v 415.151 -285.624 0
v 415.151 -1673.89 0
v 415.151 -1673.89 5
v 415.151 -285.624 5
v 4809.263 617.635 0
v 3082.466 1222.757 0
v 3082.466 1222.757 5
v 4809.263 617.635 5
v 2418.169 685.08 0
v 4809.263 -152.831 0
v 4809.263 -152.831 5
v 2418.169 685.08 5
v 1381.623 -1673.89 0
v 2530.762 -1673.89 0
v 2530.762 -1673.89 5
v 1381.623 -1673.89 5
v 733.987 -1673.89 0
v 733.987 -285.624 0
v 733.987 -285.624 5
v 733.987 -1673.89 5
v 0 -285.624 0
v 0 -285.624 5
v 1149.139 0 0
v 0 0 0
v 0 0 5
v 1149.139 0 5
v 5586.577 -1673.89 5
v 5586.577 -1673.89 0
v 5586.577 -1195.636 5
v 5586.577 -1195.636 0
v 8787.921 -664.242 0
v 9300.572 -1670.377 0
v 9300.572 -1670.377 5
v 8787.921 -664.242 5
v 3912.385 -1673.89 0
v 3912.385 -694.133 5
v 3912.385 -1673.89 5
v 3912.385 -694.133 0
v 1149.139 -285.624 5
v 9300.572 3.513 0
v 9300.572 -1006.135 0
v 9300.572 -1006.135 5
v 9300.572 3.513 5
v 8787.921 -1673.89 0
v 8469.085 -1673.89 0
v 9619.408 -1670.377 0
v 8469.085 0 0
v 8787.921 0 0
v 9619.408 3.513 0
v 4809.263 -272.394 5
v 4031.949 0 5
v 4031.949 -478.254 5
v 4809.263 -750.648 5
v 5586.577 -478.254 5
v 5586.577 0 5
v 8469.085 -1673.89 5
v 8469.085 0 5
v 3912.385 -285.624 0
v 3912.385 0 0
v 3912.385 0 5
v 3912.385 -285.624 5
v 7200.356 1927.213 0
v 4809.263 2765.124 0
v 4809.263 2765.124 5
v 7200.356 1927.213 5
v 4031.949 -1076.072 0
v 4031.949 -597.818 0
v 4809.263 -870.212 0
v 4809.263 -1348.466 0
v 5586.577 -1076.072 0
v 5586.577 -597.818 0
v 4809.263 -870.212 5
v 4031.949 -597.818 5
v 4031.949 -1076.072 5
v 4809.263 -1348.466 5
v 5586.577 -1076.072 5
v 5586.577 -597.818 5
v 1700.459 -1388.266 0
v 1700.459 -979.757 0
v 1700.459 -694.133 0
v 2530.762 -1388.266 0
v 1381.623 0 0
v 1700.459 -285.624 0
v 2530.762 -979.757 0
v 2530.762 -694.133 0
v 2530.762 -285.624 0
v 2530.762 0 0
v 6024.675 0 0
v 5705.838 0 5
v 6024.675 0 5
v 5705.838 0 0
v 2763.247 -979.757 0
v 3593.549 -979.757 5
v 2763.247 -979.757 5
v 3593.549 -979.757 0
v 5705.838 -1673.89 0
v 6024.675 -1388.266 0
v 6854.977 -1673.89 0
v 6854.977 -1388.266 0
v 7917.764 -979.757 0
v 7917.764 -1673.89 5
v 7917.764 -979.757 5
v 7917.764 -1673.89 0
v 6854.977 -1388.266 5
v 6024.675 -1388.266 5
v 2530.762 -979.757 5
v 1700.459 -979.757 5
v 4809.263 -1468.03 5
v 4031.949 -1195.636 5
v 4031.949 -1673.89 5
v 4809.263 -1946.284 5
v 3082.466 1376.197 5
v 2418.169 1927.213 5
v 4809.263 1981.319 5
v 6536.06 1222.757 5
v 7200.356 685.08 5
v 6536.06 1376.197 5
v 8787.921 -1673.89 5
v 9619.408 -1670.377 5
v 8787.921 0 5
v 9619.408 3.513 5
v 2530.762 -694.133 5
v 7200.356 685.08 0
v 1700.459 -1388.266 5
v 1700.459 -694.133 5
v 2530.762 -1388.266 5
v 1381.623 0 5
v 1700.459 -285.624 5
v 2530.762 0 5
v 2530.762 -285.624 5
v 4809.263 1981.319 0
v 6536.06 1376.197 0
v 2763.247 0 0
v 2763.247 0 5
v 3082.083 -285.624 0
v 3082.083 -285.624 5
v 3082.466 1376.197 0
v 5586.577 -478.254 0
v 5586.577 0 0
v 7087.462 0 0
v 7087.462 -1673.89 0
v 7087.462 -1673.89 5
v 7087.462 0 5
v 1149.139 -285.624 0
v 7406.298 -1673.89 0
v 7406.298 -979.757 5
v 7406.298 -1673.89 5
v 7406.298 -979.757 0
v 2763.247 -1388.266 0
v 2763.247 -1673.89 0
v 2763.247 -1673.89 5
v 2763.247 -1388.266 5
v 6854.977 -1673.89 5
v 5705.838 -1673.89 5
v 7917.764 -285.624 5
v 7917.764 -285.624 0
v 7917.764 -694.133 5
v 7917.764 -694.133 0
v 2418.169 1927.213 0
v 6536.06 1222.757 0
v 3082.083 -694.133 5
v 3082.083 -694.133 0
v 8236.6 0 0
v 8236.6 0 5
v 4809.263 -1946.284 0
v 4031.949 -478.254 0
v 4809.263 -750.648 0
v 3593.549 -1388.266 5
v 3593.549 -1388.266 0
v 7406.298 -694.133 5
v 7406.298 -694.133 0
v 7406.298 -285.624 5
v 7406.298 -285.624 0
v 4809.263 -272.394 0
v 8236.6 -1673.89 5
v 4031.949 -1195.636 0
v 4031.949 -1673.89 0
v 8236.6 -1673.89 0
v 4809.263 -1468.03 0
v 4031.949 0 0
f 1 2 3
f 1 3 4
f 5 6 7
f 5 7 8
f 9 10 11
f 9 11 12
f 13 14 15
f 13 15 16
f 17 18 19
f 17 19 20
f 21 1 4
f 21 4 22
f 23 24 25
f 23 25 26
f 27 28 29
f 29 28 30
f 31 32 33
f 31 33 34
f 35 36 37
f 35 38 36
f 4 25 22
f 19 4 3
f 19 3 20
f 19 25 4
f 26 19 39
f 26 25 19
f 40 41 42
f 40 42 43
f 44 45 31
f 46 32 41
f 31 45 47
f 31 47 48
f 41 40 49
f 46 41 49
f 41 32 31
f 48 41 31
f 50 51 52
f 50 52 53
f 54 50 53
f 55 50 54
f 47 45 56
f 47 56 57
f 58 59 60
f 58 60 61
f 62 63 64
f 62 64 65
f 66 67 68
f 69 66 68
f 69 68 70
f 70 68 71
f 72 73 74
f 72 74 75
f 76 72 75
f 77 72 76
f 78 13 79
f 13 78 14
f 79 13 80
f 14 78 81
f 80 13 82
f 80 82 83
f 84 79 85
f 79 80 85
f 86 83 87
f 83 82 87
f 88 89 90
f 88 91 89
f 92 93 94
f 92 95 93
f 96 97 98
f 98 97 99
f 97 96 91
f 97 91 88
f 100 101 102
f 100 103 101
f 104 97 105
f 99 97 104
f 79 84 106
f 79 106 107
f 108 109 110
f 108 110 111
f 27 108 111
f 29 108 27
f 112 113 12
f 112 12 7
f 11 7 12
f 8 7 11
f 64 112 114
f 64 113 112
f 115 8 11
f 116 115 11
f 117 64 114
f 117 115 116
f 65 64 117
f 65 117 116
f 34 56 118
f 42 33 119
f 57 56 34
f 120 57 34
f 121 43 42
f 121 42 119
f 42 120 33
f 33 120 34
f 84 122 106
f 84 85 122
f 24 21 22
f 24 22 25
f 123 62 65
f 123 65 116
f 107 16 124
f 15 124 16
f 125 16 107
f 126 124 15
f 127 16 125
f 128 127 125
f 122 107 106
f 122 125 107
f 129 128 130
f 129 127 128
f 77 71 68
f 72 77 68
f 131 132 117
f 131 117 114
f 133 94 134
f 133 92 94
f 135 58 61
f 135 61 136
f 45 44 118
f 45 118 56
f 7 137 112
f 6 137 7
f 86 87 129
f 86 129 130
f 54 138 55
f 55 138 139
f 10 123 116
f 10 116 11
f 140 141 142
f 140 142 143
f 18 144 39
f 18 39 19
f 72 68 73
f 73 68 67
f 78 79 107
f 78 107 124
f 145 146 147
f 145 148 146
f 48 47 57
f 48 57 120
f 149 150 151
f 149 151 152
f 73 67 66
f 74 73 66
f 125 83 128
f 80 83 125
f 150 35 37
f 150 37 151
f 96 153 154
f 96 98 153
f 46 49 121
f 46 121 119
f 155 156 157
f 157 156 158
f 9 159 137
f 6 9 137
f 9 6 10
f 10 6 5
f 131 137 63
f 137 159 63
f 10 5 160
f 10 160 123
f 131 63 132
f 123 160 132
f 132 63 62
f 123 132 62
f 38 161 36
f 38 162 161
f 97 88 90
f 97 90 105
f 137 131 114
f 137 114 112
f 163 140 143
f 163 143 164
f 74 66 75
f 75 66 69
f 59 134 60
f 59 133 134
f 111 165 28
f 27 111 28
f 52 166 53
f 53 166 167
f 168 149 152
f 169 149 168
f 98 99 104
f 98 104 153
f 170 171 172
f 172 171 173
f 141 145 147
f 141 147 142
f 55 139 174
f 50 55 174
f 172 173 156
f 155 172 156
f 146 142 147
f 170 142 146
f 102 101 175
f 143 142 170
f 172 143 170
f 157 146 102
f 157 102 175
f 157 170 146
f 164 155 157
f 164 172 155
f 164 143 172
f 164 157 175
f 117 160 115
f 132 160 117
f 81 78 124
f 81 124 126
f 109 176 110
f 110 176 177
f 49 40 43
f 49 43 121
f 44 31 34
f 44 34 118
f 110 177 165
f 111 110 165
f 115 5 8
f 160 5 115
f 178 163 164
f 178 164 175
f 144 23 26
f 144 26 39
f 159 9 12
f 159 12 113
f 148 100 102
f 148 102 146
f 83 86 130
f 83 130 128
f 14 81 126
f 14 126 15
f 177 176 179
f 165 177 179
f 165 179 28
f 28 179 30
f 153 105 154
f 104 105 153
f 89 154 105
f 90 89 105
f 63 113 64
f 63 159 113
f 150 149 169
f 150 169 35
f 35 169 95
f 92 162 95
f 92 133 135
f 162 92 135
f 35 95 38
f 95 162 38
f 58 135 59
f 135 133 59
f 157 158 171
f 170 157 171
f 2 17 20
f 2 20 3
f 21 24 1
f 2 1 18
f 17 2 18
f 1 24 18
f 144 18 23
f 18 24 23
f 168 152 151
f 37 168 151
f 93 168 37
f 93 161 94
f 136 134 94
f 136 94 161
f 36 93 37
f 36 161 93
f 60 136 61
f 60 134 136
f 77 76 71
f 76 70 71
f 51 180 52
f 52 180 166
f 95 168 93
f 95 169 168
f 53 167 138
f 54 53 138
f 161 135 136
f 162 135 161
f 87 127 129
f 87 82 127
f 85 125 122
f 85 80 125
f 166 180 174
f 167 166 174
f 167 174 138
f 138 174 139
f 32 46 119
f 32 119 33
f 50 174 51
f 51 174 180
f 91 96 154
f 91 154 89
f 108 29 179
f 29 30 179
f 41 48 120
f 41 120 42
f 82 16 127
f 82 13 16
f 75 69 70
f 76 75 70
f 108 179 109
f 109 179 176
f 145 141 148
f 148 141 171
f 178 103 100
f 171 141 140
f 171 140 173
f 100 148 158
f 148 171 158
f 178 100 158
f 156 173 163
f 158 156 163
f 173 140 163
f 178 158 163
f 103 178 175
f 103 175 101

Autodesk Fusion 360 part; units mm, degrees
sketch "Sketch1" plane through (0, 0, 0) normal (0, 0, 1) x (1, 0, 0)
  line L0 (0, 0) -> (1149.1386, 0)
  line L1 (1149.1386, 0) -> (1149.1386, -285.624)
  line L2 (1149.1386, -285.624) -> (733.9874, -285.624)
  line L3 (733.9874, -285.624) -> (733.9874, -1673.8897)
  line L4 (733.9874, -1673.8897) -> (415.1512, -1673.8897)
  line L5 (415.1512, -1673.8897) -> (415.1512, -285.624)
  line L6 (415.1512, -285.624) -> (0, -285.624)
  line L7 (0, -285.624) -> (0, 0)
  line L8 (1149.1386, 0) -> (1381.6233, 0) construction
  line L9 (1381.6233, 0) -> (2530.7619, 0)
  line L10 (2530.7619, 0) -> (2530.7619, -285.624)
  line L11 (2530.7619, -285.624) -> (1700.4594, -285.624)
  line L12 (1700.4594, -285.624) -> (1700.4594, -694.1329)
  line L13 (1700.4594, -694.1329) -> (2530.7619, -694.1329)
  line L14 (2530.7619, -694.1329) -> (2530.7619, -979.7569)
  line L15 (2530.7619, -979.7569) -> (1700.4594, -979.7569)
  line L16 (1700.4594, -979.7569) -> (1700.4594, -1388.2657)
  line L17 (1700.4594, -1388.2657) -> (2530.7619, -1388.2657)
  line L18 (2530.7619, -1388.2657) -> (2530.7619, -1673.8897)
  line L19 (2530.7619, -1673.8897) -> (1381.6233, -1673.8897)
  line L20 (1381.6233, -1673.8897) -> (1381.6233, 0)
  line L21 (2530.7619, 0) -> (2763.2466, 0) construction
  line L22 (2763.2466, 0) -> (3912.3852, 0)
  line L23 (3912.3852, 0) -> (3912.3852, -285.624)
  line L24 (3912.3852, -285.624) -> (3082.0827, -285.624)
  line L25 (3082.0827, -285.624) -> (3082.0827, -694.1329)
  line L26 (3082.0827, -694.1329) -> (3912.3852, -694.1329)
  line L27 (3912.3852, -694.1329) -> (3912.3852, -1673.8897)
  line L28 (3912.3852, -1673.8897) -> (2763.2466, -1673.8897)
  line L29 (2763.2466, -1673.8897) -> (2763.2466, -1388.2657)
  line L30 (2763.2466, -1388.2657) -> (3593.549, -1388.2657)
  line L31 (3593.549, -1388.2657) -> (3593.549, -979.7569)
  line L32 (3593.549, -979.7569) -> (2763.2466, -979.7569)
  line L33 (2763.2466, -979.7569) -> (2763.2466, 0)
  line L34 (3912.3852, 0) -> (4031.9487, 0) construction
  line L35 (4031.9487, 0) -> (5586.2749, 0) construction
  line L36 (5586.2749, 0) -> (5705.8385, 0) construction
  line L37 (5705.8385, 0) -> (6024.6746, 0)
  line L38 (6024.6746, 0) -> (6024.6746, -1388.2657)
  line L39 (6024.6746, -1388.2657) -> (6854.977, -1388.2657)
  line L40 (6854.977, -1388.2657) -> (6854.977, -1673.8897)
  line L41 (6854.977, -1673.8897) -> (5705.8385, -1673.8897)
  line L42 (5705.8385, -1673.8897) -> (5705.8385, 0)
  line L43 (6854.977, -1388.2657) -> (7087.4617, -1388.2657) construction
  line L44 (7087.4617, -1388.2657) -> (7087.4617, 0)
  line L45 (7087.4617, 0) -> (8236.6003, 0)
  line L46 (8236.6003, 0) -> (8236.6003, -1673.8897)
  line L47 (8236.6003, -1673.8897) -> (7917.7642, -1673.8897)
  line L48 (7917.7642, -1673.8897) -> (7917.7642, -979.7569)
  line L49 (7917.7642, -979.7569) -> (7406.2979, -979.7569)
  line L50 (7406.2979, -979.7569) -> (7406.2979, -1673.8897)
  line L51 (7406.2979, -1673.8897) -> (7087.4617, -1673.8897)
  line L52 (7087.4617, -1673.8897) -> (7087.4617, -1388.2657)
  line L53 (7087.4617, 0) -> (7406.2979, 0) construction
  line L54 (7406.2979, 0) -> (7406.2979, -285.624) construction
  line L55 (7406.2979, -285.624) -> (7087.4617, -285.624) construction
  line L56 (7087.4617, -285.624) -> (7087.4617, 0) construction
  line L57 (7406.2979, -285.624) -> (7917.7642, -285.624)
  line L58 (7917.7642, -285.624) -> (7917.7642, -694.1329)
  line L59 (7917.7642, -694.1329) -> (7406.2979, -694.1329)
  line L60 (7406.2979, -694.1329) -> (7406.2979, -285.624)
  line L61 (8236.6003, 0) -> (8469.085, 0) construction
  line L62 (8469.085, 0) -> (8787.9212, 0)
  line L63 (8787.9212, 0) -> (9300.5724, -1006.1347)
  line L64 (9300.5724, -1006.1347) -> (9300.5724, 3.5131)
  line L65 (9300.5724, 3.5131) -> (9619.4085, 3.5131)
  line L66 (9619.4085, 3.5131) -> (9619.4085, -1670.3766)
  line L67 (9619.4085, -1670.3766) -> (9300.5724, -1670.3766)
  line L68 (9300.5724, -1670.3766) -> (8787.9212, -664.242)
  line L69 (8787.9212, -664.242) -> (8787.9212, -1673.8897)
  line L70 (8787.9212, -1673.8897) -> (8469.085, -1673.8897)
  line L71 (8469.085, -1673.8897) -> (8469.085, 0)
  line L72 (4031.9487, 0) -> (4031.9487, -478.2542)
  line L73 (4031.9487, -478.2542) -> (4809.2628, -750.6485)
  line L74 (4809.2628, -750.6485) -> (5586.5769, -478.2542)
  line L75 (5586.5769, -478.2542) -> (5586.5769, 0)
  line L76 (5586.5769, 0) -> (4809.2628, -272.3943)
  line L77 (4809.2628, -272.3943) -> (4031.9487, 0)
  line L78 (4031.9487, -478.2542) -> (4031.9487, -597.8178) construction
  line L79 (4031.9487, -597.8178) -> (4031.9487, -1076.072)
  line L80 (4031.9487, -1076.072) -> (4809.2628, -1348.4663)
  line L81 (4809.2628, -1348.4663) -> (5586.5769, -1076.072)
  line L82 (5586.5769, -1076.072) -> (5586.5769, -597.8178)
  line L83 (5586.5769, -597.8178) -> (4809.2628, -870.2121)
  line L84 (4809.2628, -870.2121) -> (4031.9487, -597.8178)
  line L85 (4031.9487, -1076.072) -> (4031.9487, -1195.6355) construction
  line L86 (4031.9487, -1195.6355) -> (4031.9487, -1673.8897)
  line L87 (4031.9487, -1673.8897) -> (4809.2628, -1946.284)
  line L88 (4809.2628, -1946.284) -> (5586.5769, -1673.8897)
  line L89 (5586.5769, -1673.8897) -> (5586.5769, -1195.6355)
  line L90 (5586.5769, -1195.6355) -> (4809.2628, -1468.0298)
  line L91 (4809.2628, -1468.0298) -> (4031.9487, -1195.6355)
  line L92 (4809.2628, -272.3943) -> (4809.2628, -152.8307) construction
  line L93 (4809.2628, -152.8307) -> (2418.1694, 685.0805)
  line L94 (2418.1694, 685.0805) -> (2418.1694, 1927.213)
  line L95 (2418.1694, 1927.213) -> (4809.2628, 2765.1242)
  line L96 (4809.2628, 2765.1242) -> (7200.3562, 1927.213)
  line L97 (7200.3562, 1927.213) -> (7200.3562, 685.0805)
  line L98 (7200.3562, 685.0805) -> (4809.2628, -152.8307)
  line L99 (4809.2628, 2765.1242) -> (4809.2628, 1981.3187) construction
  line L100 (4809.2628, 1981.3187) -> (3082.4658, 1376.1969)
  line L101 (3082.4658, 1376.1969) -> (3082.4658, 1222.757)
  line L102 (3082.4658, 1222.757) -> (4809.2628, 617.6353)
  line L103 (4809.2628, 617.6353) -> (6536.0598, 1222.757)
  line L104 (6536.0598, 1222.757) -> (6536.0598, 1376.1969)
  line L105 (6536.0598, 1376.1969) -> (4809.2628, 1981.3187)
  dimension "d38" = 1149.1386
  dimension "d39" = 90
  dimension "d40" = 285.624
  dimension "d41" = 90
  dimension "d42" = 415.1512
  dimension "d43" = 90
  dimension "d44" = 1388.2657
  dimension "d45" = 90
  dimension "d46" = 318.8361
  dimension "d47" = 90
  dimension "d48" = 1388.2657
  dimension "d49" = 90
  dimension "d50" = 415.1512
  dimension "d51" = 285.624
  dimension "d52" = 90
  dimension "d53" = 232.4847
  dimension "d54" = 1149.1386
  dimension "d55" = 285.624
  dimension "d56" = 90
  dimension "d57" = 830.3025
  dimension "d58" = 90
  dimension "d59" = 408.5088
  dimension "d60" = 90
  dimension "d61" = 830.3025
  dimension "d62" = 285.624
  dimension "d63" = 90
  dimension "d64" = 830.3025
  dimension "d65" = 408.5088
  dimension "d66" = 830.3025
  dimension "d67" = 285.624
  dimension "d68" = 1149.1386
  dimension "d69" = 232.4847
  dimension "d70" = 1149.1386
  dimension "d71" = 90
  dimension "d72" = 285.624
  dimension "d73" = 90
  dimension "d74" = 830.3025
  dimension "d75" = 408.5088
  dimension "d76" = 830.3025
  dimension "d77" = 979.7569
  dimension "d78" = 1149.1386
  dimension "d79" = 285.624
  dimension "d80" = 830.3025
  dimension "d81" = 408.5088
  dimension "d82" = 830.3025
  dimension "d83" = 119.5636
  dimension "d84" = 1554.3262
  dimension "d85" = 119.5636
  dimension "d86" = 318.8361
  dimension "d87" = 1388.2657
  dimension "d88" = 830.3025
  dimension "d89" = 285.624
  dimension "d90" = 1149.1386
  dimension "d91" = 1673.8897
  dimension "d92" = 232.4847
  dimension "d93" = 1388.2657
  dimension "d94" = 1149.1386
  dimension "d95" = 1673.8897
  dimension "d96" = 318.8361
  dimension "d97" = 694.1329
  dimension "d98" = 511.4663
  dimension "d99" = 694.1329
  dimension "d100" = 318.8361
  dimension "d101" = 318.8361
  dimension "d102" = 285.624
  dimension "d103" = 511.4663
  dimension "d104" = 408.5088
  dimension "d105" = 232.4847
  dimension "d106" = 318.8361
  dimension "d107" = 117
  dimension "d108" = 1129.2113
  dimension "d109" = 1009.6478
  dimension "d110" = 318.8361
  dimension "d111" = 1673.8897
  dimension "d112" = 318.8361
  dimension "d113" = 117
  dimension "d114" = 1129.2113
  dimension "d115" = 1009.6478
  dimension "d116" = 318.8361
  dimension "d117" = 478.2542
  dimension "d118" = 109.312
  dimension "d119" = 823.66
  dimension "d120" = 141.376
  dimension "d121" = 823.66
  dimension "d122" = 109.312
  dimension "d123" = 478.2542
  dimension "d124" = 70.688
  dimension "d125" = 823.66
  dimension "d126" = 119.5636
  dimension "d127" = 478.2542
  dimension "d128" = 823.66
  dimension "d129" = 109.312
  dimension "d130" = 141.376
  dimension "d131" = 823.66
  dimension "d132" = 109.312
  dimension "d133" = 478.2542
  dimension "d134" = 70.688
  dimension "d135" = 823.66
  dimension "d136" = 119.5636
  dimension "d137" = 478.2542
  dimension "d138" = 109.312
  dimension "d139" = 823.66
  dimension "d140" = 141.376
  dimension "d141" = 823.66
  dimension "d142" = 109.312
  dimension "d143" = 478.2542
  dimension "d144" = 70.688
  dimension "d145" = 823.66
  dimension "d146" = 119.5636
  dimension "d147" = 109.312
  dimension "d148" = 2533.658
  dimension "d149" = 109.312
  dimension "d150" = 1242.1325
  dimension "d151" = 109.312
  dimension "d152" = 2533.658
  dimension "d153" = 141.376
  dimension "d154" = 2533.658
  dimension "d155" = 109.312
  dimension "d156" = 1242.1325
  dimension "d157" = 783.8055
  dimension "d158" = 1829.7541
  dimension "d159" = 153.4399
  dimension "d160" = 109.312
  dimension "d161" = 109.312
  dimension "d162" = 1829.7541
  dimension "d163" = 141.376
  dimension "d164" = 1829.7541
  dimension "d165" = 109.312
  dimension "d166" = 153.4399
extrude "Extrude1" add sketch "Sketch1" along normal blind 5 makes body 1 at (1487.902, -789.3409, 0) makes body 2 at (5068.3675, -500.4323, 0) makes body 3 at (521.4299, -748.3793, 0) makes body 4 at (3436.6327, 2022.8447, 0) makes body 5 at (7193.7404, -789.3409, 0) makes body 6 at (5812.1172, -1020.7185, 0) makes body 7 at (5068.3675, -1098.2501, 0) makes body 8 at (9513.1298, -890.9994, 0) makes body 9 at (5068.3675, -1696.0679, 0) makes body 10 at (2869.5253, -557.9632, 0)
equation "scaling_factor = 0.006642419620910471" comment "<-- scaling factor dimension calculator-inator"
equation "sf = scaling_factor * 1000"
equation "AA = ( 173 * sf ) * 1 mm"
equation "AB = ( 43 * sf ) * 1 mm"
equation "AC = ( 62.5 * sf ) * 1 mm"
equation "AD = ( 209 * sf ) * 1 mm"
equation "AE = ( 48 * sf ) * 1 mm"
equation "AF = ( 125 * sf ) * 1 mm"
equation "AG = ( 61.5 * sf ) * 1 mm"
equation "AH = ( 252 * sf ) * 1 mm"
equation "AI = ( 147.5 * sf ) * 1 mm"
equation "AJ = ( 72 * sf ) * 1 mm"
equation "AK = ( 124 * sf ) * 1 mm"
equation "AL = ( 104.5 * sf ) * 1 mm"
equation "AM = ( 77 * sf ) * 1 mm"
equation "AN = ( 152 * sf ) * 1 mm"
equation "AO = ( 170 * sf ) * 1 mm"
equation "AP = ( 381.436 * sf ) * 1 mm"
equation "AQ = ( 187 * sf ) * 1 mm"
equation "AR = ( 275.465 * sf ) * 1 mm"
equation "AS = ( 23.1 * sf ) * 1 mm"
equation "BA = ( 35 * sf ) * 1 mm"
equation "BB = ( 18 * sf ) * 1 mm"
equation "BC = ( 234 * sf ) * 1 mm"
equation "BD = ( 77 * sf ) * 1 mm"
equation "BE = ( 48 * sf ) * 1 mm"
equation "BF = ( 43 * sf ) * 1 mm"
equation "BH = ( 118 * sf ) * 1 mm"
equation "tw = ( 1148 * sf ) * 1 mm"
equation "th = ( 709.2 * sf ) * 1 mm"
equation "aa = 70.688 deg"
equation "ab = 109.312 deg"
equation "ac = 141.376 deg"
equation "af = 27 deg"
equation "agg = 117 deg" comment "Letop, ag was al bezet, dus deze heet agg"
equation "d38 = AA"
equation "d40 = AB"
equation "d42 = AC"
equation "d44 = AD"
equation "d46 = AE"
equation "d48 = AD"
equation "d50 = AC"
equation "d51 = AB"
equation "d53 = BA"
equation "d54 = AA"
equation "d55 = AB"
equation "d57 = AF"
equation "d59 = AG"
equation "d61 = AF"
equation "d62 = AB"
equation "d64 = AF"
equation "d65 = AG"
equation "d66 = AF"
equation "d67 = AB"
equation "d68 = AA"
equation "d69 = BA"
equation "d70 = AA"
equation "d72 = AB"
equation "d74 = AF"
equation "d75 = AG"
equation "d76 = AF"
equation "d77 = AI"
equation "d78 = AA"
equation "d79 = AB"
equation "d80 = AF"
equation "d81 = AG"
equation "d82 = AF"
equation "d83 = BB"
equation "d84 = BC"
equation "d85 = BB"
equation "d86 = AE"
equation "d87 = AD"
equation "d88 = AF"
equation "d89 = AB"
equation "d90 = AA"
equation "d91 = AH"
equation "d92 = BA"
equation "d93 = AH - AB"
equation "d94 = AA"
equation "d95 = AH"
equation "d96 = AE"
equation "d97 = AL"
equation "d98 = AM"
equation "d99 = AL"
equation "d100 = AE"
equation "d101 = BE"
equation "d102 = BF"
equation "d103 = AM"
equation "d104 = AG"
equation "d105 = BA"
equation "d106 = AE"
equation "d107 = agg"
equation "d108 = AO"
equation "d109 = AN"
equation "d110 = AE"
equation "d111 = AH"
equation "d112 = AE"
equation "d113 = agg"
equation "d114 = AO"
equation "d115 = AN"
equation "d116 = AE"
equation "d117 = AJ"
equation "d118 = ab"
equation "d119 = AK"
equation "d120 = ac"
equation "d121 = AK"
equation "d122 = ab"
equation "d123 = AJ"
equation "d124 = aa"
equation "d125 = AK"
equation "d126 = BB"
equation "d127 = AJ"
equation "d128 = AK"
equation "d129 = ab"
equation "d130 = ac"
equation "d131 = AK"
equation "d132 = ab"
equation "d133 = AJ"
equation "d134 = aa"
equation "d135 = AK"
equation "d136 = BB"
equation "d137 = AJ"
equation "d138 = ab"
equation "d139 = AK"
equation "d140 = ac"
equation "d141 = AK"
equation "d142 = ab"
equation "d143 = AJ"
equation "d144 = aa"
equation "d145 = AK"
equation "d146 = BB"
equation "d147 = 180 deg - ( ac / 2 )"
equation "d148 = AP"
equation "d149 = ab"
equation "d150 = AQ"
equation "d151 = ab"
equation "d152 = AP"
equation "d153 = ac"
equation "d154 = AP"
equation "d155 = ab"
equation "d156 = AQ"
equation "d157 = BH"
equation "d158 = AR"
equation "d159 = AS"
equation "d160 = ab"
equation "d161 = ab"
equation "d162 = AR"
equation "d163 = ac"
equation "d164 = AR"
equation "d165 = ab"
equation "d166 = AS"
